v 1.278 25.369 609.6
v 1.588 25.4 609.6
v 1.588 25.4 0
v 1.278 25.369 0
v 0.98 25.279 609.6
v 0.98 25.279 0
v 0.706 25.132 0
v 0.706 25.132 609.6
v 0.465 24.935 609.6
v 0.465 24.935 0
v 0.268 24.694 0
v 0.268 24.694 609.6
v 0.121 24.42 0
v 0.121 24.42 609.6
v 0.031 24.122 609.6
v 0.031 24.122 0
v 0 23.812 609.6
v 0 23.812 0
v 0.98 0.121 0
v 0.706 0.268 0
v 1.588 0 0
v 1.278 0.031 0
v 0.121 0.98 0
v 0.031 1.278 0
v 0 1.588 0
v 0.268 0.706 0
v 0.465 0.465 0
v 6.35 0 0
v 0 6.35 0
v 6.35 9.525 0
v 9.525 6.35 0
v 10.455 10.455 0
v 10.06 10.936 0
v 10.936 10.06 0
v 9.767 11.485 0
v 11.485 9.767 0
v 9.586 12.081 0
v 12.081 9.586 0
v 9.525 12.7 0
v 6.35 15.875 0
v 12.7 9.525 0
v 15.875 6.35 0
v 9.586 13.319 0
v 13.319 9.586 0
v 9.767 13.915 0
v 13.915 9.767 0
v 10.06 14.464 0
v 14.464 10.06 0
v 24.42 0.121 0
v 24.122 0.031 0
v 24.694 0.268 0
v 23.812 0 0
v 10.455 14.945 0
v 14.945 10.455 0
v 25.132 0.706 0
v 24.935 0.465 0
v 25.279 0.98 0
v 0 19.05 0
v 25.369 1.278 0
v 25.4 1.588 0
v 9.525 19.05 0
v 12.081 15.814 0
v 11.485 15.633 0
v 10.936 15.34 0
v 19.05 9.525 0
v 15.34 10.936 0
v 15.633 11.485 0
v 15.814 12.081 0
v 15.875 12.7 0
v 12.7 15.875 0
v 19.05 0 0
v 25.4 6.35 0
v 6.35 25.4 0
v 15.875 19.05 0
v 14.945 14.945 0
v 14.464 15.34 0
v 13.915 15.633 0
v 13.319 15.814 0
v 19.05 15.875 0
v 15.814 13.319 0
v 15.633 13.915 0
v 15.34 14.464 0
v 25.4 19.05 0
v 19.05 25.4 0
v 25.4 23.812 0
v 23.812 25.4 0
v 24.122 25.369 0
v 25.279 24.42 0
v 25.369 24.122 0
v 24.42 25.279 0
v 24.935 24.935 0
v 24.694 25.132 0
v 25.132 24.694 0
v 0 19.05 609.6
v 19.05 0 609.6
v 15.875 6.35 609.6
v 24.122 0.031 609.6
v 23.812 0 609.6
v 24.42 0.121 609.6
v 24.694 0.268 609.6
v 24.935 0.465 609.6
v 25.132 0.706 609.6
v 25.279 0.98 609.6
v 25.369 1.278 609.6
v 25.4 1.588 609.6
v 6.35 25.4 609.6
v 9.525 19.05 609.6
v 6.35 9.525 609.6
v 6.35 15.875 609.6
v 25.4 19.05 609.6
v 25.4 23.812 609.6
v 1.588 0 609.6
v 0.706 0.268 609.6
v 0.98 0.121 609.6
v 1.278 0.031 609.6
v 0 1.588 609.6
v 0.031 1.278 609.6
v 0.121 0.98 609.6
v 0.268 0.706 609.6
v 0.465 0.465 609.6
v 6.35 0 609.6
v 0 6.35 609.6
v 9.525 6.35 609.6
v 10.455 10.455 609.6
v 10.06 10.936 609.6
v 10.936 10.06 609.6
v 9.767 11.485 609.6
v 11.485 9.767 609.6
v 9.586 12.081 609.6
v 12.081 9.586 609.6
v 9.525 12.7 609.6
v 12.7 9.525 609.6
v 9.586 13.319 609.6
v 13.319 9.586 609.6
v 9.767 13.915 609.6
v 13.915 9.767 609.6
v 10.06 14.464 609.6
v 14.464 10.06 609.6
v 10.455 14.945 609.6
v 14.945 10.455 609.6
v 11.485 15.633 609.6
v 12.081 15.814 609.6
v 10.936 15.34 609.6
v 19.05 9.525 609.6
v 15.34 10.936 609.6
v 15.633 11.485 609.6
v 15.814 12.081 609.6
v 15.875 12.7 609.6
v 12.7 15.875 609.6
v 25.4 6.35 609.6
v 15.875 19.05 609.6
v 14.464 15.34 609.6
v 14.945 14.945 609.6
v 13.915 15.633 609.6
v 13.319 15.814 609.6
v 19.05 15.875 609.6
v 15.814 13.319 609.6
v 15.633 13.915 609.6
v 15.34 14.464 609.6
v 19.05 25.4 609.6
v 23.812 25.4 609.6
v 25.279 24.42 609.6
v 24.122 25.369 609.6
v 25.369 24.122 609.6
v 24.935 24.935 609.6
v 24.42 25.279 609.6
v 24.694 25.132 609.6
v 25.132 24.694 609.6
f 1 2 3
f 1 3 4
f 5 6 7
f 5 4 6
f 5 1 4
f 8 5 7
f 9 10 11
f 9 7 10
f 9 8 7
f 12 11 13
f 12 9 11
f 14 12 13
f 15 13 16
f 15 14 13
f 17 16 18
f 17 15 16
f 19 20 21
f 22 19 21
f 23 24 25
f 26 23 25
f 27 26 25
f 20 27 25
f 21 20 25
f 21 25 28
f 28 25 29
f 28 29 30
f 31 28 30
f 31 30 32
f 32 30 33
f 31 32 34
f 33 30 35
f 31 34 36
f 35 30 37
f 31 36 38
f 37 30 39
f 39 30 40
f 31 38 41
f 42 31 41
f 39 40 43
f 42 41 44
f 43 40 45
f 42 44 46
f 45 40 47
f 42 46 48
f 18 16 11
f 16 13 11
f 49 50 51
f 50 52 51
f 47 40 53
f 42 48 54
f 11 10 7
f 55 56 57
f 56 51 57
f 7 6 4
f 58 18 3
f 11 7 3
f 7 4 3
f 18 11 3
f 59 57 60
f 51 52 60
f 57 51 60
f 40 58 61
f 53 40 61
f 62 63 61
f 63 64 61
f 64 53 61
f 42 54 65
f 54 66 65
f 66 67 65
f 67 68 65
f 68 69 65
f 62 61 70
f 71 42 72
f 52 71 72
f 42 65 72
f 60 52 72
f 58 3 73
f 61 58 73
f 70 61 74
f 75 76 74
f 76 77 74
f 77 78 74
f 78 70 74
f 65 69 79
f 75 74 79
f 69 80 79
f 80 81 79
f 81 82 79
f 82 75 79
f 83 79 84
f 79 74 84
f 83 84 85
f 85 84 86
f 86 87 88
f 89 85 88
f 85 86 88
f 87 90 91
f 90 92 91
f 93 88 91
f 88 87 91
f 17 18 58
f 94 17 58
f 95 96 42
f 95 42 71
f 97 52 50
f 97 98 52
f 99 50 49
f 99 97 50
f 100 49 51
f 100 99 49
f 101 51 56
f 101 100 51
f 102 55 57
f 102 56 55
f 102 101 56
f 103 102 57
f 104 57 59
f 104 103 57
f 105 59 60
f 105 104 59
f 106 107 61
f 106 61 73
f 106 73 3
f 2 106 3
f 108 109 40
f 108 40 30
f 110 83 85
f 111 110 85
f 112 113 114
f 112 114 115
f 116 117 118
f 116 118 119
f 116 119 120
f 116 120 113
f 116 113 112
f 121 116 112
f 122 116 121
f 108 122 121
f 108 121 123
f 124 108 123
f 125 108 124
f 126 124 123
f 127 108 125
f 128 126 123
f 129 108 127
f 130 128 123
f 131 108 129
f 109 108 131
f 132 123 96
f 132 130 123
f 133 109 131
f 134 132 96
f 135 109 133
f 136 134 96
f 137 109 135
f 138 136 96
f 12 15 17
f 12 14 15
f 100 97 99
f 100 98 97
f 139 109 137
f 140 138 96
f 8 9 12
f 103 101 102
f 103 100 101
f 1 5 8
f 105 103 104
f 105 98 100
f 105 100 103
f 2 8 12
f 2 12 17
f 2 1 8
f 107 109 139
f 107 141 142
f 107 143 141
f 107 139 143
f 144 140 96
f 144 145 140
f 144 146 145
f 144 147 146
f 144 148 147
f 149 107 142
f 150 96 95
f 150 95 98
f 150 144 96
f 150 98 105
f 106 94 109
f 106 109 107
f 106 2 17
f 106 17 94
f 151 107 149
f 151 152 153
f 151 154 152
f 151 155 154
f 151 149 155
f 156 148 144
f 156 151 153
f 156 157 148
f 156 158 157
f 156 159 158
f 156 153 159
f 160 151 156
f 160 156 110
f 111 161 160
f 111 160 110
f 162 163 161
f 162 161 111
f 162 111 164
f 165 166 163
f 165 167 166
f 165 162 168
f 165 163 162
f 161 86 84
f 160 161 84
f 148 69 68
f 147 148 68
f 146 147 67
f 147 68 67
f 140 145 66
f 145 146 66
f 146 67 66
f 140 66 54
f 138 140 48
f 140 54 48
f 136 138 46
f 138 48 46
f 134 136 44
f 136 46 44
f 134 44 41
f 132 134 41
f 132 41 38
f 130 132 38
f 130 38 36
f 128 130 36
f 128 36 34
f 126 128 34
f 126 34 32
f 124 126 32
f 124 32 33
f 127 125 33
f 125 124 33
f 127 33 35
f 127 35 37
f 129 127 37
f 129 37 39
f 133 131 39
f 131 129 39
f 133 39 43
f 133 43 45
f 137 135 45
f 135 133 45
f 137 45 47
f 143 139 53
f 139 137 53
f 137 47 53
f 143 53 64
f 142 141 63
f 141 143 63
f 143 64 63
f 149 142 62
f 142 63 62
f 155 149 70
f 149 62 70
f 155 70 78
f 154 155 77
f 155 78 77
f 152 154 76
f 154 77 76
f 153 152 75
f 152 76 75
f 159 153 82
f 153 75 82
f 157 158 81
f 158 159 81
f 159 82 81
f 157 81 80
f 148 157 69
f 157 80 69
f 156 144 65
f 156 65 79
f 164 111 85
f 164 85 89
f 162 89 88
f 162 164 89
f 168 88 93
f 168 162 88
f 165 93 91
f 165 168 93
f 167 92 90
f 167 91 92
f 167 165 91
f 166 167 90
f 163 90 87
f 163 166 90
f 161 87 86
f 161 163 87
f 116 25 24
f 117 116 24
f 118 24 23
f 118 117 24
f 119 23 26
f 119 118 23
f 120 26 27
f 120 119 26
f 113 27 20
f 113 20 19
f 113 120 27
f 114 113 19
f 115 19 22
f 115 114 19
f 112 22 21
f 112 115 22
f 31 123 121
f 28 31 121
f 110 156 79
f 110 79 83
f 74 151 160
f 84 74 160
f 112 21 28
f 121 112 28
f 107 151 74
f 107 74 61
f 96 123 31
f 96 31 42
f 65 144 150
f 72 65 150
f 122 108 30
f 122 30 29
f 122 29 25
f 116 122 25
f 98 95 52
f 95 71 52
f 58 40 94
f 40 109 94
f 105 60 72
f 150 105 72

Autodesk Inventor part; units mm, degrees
ref_plane "YZ Plane" through (0, 0, 0) normal (1, 0, 0) x (0, 1, 0)
ref_plane "XZ Plane" through (0, 0, 0) normal (0, 1, 0) x (-1, 0, 0)
ref_plane "XY Plane" through (0, 0, 0) normal (0, 0, 1) x (1, 0, 0)
sketch "Sketch1" plane through (0, 0, 0) normal (0, 0, 1) x (1, 0, 0)
  line L0 (0, 0) -> (25.4, 0)
  line L1 (25.4, 0) -> (25.4, 25.4)
  line L2 (25.4, 25.4) -> (0, 25.4)
  line L3 (0, 25.4) -> (0, 0)
  circle A0 centre (12.7, 12.7) radius 3.175
  dimension "d0" = 25.4
  dimension "d1" = 25.4
  dimension "d2" = 6.35
  dimension "d7" = 12.7
  dimension "d8" = 12.7
extrude "Extrusion1" add sketch "Sketch1" along normal blind 609.6
sketch "Sketch2" plane through (0, 0, 609.6) normal (0, 0, 1) x (1, 0, 0)
  line L0 (25.4, 25.4) -> (0, 25.4) projected
  line L1 (0, 25.4) -> (0, 0) projected
  circle A0 centre (12.7, 12.7) radius 3.175 projected
  line L2 (0, 0) -> (25.4, 0) projected
  line L3 (25.4, 0) -> (25.4, 25.4) projected
  line L4 (25.4, 25.4) -> (0, 25.4) projected
  line L5 (0, 25.4) -> (0, 0) projected
  line L6 (12.7, 19.05) -> (9.525, 19.05)
  line L7 (9.525, 19.05) -> (15.875, 19.05)
  line L8 (15.875, 19.05) -> (19.05, 25.4)
  line L9 (9.525, 19.05) -> (6.35, 25.4)
  dimension "d13" = 6.35
  dimension "d14" = 6.35
  dimension "d15" = 3.175
  dimension "d16" = 6.35
fillet "Fillet1" radius 1.5875 4 edges at (25.4, 25.4, 304.8) (0, 25.4, 304.8) (25.4, 0, 304.8) (0, 0, 304.8)
extrude "Extrusion2" cut sketch "Sketch2" against normal blind 609.6 contours L8 L7 L6 L9 L0
pattern_circular "Circular Pattern1" count 4 over 360 about axis through (12.7, 12.7, 0) along (0, 0, 1) of "Extrusion2"
properties part number "Mock 8020 24in"
